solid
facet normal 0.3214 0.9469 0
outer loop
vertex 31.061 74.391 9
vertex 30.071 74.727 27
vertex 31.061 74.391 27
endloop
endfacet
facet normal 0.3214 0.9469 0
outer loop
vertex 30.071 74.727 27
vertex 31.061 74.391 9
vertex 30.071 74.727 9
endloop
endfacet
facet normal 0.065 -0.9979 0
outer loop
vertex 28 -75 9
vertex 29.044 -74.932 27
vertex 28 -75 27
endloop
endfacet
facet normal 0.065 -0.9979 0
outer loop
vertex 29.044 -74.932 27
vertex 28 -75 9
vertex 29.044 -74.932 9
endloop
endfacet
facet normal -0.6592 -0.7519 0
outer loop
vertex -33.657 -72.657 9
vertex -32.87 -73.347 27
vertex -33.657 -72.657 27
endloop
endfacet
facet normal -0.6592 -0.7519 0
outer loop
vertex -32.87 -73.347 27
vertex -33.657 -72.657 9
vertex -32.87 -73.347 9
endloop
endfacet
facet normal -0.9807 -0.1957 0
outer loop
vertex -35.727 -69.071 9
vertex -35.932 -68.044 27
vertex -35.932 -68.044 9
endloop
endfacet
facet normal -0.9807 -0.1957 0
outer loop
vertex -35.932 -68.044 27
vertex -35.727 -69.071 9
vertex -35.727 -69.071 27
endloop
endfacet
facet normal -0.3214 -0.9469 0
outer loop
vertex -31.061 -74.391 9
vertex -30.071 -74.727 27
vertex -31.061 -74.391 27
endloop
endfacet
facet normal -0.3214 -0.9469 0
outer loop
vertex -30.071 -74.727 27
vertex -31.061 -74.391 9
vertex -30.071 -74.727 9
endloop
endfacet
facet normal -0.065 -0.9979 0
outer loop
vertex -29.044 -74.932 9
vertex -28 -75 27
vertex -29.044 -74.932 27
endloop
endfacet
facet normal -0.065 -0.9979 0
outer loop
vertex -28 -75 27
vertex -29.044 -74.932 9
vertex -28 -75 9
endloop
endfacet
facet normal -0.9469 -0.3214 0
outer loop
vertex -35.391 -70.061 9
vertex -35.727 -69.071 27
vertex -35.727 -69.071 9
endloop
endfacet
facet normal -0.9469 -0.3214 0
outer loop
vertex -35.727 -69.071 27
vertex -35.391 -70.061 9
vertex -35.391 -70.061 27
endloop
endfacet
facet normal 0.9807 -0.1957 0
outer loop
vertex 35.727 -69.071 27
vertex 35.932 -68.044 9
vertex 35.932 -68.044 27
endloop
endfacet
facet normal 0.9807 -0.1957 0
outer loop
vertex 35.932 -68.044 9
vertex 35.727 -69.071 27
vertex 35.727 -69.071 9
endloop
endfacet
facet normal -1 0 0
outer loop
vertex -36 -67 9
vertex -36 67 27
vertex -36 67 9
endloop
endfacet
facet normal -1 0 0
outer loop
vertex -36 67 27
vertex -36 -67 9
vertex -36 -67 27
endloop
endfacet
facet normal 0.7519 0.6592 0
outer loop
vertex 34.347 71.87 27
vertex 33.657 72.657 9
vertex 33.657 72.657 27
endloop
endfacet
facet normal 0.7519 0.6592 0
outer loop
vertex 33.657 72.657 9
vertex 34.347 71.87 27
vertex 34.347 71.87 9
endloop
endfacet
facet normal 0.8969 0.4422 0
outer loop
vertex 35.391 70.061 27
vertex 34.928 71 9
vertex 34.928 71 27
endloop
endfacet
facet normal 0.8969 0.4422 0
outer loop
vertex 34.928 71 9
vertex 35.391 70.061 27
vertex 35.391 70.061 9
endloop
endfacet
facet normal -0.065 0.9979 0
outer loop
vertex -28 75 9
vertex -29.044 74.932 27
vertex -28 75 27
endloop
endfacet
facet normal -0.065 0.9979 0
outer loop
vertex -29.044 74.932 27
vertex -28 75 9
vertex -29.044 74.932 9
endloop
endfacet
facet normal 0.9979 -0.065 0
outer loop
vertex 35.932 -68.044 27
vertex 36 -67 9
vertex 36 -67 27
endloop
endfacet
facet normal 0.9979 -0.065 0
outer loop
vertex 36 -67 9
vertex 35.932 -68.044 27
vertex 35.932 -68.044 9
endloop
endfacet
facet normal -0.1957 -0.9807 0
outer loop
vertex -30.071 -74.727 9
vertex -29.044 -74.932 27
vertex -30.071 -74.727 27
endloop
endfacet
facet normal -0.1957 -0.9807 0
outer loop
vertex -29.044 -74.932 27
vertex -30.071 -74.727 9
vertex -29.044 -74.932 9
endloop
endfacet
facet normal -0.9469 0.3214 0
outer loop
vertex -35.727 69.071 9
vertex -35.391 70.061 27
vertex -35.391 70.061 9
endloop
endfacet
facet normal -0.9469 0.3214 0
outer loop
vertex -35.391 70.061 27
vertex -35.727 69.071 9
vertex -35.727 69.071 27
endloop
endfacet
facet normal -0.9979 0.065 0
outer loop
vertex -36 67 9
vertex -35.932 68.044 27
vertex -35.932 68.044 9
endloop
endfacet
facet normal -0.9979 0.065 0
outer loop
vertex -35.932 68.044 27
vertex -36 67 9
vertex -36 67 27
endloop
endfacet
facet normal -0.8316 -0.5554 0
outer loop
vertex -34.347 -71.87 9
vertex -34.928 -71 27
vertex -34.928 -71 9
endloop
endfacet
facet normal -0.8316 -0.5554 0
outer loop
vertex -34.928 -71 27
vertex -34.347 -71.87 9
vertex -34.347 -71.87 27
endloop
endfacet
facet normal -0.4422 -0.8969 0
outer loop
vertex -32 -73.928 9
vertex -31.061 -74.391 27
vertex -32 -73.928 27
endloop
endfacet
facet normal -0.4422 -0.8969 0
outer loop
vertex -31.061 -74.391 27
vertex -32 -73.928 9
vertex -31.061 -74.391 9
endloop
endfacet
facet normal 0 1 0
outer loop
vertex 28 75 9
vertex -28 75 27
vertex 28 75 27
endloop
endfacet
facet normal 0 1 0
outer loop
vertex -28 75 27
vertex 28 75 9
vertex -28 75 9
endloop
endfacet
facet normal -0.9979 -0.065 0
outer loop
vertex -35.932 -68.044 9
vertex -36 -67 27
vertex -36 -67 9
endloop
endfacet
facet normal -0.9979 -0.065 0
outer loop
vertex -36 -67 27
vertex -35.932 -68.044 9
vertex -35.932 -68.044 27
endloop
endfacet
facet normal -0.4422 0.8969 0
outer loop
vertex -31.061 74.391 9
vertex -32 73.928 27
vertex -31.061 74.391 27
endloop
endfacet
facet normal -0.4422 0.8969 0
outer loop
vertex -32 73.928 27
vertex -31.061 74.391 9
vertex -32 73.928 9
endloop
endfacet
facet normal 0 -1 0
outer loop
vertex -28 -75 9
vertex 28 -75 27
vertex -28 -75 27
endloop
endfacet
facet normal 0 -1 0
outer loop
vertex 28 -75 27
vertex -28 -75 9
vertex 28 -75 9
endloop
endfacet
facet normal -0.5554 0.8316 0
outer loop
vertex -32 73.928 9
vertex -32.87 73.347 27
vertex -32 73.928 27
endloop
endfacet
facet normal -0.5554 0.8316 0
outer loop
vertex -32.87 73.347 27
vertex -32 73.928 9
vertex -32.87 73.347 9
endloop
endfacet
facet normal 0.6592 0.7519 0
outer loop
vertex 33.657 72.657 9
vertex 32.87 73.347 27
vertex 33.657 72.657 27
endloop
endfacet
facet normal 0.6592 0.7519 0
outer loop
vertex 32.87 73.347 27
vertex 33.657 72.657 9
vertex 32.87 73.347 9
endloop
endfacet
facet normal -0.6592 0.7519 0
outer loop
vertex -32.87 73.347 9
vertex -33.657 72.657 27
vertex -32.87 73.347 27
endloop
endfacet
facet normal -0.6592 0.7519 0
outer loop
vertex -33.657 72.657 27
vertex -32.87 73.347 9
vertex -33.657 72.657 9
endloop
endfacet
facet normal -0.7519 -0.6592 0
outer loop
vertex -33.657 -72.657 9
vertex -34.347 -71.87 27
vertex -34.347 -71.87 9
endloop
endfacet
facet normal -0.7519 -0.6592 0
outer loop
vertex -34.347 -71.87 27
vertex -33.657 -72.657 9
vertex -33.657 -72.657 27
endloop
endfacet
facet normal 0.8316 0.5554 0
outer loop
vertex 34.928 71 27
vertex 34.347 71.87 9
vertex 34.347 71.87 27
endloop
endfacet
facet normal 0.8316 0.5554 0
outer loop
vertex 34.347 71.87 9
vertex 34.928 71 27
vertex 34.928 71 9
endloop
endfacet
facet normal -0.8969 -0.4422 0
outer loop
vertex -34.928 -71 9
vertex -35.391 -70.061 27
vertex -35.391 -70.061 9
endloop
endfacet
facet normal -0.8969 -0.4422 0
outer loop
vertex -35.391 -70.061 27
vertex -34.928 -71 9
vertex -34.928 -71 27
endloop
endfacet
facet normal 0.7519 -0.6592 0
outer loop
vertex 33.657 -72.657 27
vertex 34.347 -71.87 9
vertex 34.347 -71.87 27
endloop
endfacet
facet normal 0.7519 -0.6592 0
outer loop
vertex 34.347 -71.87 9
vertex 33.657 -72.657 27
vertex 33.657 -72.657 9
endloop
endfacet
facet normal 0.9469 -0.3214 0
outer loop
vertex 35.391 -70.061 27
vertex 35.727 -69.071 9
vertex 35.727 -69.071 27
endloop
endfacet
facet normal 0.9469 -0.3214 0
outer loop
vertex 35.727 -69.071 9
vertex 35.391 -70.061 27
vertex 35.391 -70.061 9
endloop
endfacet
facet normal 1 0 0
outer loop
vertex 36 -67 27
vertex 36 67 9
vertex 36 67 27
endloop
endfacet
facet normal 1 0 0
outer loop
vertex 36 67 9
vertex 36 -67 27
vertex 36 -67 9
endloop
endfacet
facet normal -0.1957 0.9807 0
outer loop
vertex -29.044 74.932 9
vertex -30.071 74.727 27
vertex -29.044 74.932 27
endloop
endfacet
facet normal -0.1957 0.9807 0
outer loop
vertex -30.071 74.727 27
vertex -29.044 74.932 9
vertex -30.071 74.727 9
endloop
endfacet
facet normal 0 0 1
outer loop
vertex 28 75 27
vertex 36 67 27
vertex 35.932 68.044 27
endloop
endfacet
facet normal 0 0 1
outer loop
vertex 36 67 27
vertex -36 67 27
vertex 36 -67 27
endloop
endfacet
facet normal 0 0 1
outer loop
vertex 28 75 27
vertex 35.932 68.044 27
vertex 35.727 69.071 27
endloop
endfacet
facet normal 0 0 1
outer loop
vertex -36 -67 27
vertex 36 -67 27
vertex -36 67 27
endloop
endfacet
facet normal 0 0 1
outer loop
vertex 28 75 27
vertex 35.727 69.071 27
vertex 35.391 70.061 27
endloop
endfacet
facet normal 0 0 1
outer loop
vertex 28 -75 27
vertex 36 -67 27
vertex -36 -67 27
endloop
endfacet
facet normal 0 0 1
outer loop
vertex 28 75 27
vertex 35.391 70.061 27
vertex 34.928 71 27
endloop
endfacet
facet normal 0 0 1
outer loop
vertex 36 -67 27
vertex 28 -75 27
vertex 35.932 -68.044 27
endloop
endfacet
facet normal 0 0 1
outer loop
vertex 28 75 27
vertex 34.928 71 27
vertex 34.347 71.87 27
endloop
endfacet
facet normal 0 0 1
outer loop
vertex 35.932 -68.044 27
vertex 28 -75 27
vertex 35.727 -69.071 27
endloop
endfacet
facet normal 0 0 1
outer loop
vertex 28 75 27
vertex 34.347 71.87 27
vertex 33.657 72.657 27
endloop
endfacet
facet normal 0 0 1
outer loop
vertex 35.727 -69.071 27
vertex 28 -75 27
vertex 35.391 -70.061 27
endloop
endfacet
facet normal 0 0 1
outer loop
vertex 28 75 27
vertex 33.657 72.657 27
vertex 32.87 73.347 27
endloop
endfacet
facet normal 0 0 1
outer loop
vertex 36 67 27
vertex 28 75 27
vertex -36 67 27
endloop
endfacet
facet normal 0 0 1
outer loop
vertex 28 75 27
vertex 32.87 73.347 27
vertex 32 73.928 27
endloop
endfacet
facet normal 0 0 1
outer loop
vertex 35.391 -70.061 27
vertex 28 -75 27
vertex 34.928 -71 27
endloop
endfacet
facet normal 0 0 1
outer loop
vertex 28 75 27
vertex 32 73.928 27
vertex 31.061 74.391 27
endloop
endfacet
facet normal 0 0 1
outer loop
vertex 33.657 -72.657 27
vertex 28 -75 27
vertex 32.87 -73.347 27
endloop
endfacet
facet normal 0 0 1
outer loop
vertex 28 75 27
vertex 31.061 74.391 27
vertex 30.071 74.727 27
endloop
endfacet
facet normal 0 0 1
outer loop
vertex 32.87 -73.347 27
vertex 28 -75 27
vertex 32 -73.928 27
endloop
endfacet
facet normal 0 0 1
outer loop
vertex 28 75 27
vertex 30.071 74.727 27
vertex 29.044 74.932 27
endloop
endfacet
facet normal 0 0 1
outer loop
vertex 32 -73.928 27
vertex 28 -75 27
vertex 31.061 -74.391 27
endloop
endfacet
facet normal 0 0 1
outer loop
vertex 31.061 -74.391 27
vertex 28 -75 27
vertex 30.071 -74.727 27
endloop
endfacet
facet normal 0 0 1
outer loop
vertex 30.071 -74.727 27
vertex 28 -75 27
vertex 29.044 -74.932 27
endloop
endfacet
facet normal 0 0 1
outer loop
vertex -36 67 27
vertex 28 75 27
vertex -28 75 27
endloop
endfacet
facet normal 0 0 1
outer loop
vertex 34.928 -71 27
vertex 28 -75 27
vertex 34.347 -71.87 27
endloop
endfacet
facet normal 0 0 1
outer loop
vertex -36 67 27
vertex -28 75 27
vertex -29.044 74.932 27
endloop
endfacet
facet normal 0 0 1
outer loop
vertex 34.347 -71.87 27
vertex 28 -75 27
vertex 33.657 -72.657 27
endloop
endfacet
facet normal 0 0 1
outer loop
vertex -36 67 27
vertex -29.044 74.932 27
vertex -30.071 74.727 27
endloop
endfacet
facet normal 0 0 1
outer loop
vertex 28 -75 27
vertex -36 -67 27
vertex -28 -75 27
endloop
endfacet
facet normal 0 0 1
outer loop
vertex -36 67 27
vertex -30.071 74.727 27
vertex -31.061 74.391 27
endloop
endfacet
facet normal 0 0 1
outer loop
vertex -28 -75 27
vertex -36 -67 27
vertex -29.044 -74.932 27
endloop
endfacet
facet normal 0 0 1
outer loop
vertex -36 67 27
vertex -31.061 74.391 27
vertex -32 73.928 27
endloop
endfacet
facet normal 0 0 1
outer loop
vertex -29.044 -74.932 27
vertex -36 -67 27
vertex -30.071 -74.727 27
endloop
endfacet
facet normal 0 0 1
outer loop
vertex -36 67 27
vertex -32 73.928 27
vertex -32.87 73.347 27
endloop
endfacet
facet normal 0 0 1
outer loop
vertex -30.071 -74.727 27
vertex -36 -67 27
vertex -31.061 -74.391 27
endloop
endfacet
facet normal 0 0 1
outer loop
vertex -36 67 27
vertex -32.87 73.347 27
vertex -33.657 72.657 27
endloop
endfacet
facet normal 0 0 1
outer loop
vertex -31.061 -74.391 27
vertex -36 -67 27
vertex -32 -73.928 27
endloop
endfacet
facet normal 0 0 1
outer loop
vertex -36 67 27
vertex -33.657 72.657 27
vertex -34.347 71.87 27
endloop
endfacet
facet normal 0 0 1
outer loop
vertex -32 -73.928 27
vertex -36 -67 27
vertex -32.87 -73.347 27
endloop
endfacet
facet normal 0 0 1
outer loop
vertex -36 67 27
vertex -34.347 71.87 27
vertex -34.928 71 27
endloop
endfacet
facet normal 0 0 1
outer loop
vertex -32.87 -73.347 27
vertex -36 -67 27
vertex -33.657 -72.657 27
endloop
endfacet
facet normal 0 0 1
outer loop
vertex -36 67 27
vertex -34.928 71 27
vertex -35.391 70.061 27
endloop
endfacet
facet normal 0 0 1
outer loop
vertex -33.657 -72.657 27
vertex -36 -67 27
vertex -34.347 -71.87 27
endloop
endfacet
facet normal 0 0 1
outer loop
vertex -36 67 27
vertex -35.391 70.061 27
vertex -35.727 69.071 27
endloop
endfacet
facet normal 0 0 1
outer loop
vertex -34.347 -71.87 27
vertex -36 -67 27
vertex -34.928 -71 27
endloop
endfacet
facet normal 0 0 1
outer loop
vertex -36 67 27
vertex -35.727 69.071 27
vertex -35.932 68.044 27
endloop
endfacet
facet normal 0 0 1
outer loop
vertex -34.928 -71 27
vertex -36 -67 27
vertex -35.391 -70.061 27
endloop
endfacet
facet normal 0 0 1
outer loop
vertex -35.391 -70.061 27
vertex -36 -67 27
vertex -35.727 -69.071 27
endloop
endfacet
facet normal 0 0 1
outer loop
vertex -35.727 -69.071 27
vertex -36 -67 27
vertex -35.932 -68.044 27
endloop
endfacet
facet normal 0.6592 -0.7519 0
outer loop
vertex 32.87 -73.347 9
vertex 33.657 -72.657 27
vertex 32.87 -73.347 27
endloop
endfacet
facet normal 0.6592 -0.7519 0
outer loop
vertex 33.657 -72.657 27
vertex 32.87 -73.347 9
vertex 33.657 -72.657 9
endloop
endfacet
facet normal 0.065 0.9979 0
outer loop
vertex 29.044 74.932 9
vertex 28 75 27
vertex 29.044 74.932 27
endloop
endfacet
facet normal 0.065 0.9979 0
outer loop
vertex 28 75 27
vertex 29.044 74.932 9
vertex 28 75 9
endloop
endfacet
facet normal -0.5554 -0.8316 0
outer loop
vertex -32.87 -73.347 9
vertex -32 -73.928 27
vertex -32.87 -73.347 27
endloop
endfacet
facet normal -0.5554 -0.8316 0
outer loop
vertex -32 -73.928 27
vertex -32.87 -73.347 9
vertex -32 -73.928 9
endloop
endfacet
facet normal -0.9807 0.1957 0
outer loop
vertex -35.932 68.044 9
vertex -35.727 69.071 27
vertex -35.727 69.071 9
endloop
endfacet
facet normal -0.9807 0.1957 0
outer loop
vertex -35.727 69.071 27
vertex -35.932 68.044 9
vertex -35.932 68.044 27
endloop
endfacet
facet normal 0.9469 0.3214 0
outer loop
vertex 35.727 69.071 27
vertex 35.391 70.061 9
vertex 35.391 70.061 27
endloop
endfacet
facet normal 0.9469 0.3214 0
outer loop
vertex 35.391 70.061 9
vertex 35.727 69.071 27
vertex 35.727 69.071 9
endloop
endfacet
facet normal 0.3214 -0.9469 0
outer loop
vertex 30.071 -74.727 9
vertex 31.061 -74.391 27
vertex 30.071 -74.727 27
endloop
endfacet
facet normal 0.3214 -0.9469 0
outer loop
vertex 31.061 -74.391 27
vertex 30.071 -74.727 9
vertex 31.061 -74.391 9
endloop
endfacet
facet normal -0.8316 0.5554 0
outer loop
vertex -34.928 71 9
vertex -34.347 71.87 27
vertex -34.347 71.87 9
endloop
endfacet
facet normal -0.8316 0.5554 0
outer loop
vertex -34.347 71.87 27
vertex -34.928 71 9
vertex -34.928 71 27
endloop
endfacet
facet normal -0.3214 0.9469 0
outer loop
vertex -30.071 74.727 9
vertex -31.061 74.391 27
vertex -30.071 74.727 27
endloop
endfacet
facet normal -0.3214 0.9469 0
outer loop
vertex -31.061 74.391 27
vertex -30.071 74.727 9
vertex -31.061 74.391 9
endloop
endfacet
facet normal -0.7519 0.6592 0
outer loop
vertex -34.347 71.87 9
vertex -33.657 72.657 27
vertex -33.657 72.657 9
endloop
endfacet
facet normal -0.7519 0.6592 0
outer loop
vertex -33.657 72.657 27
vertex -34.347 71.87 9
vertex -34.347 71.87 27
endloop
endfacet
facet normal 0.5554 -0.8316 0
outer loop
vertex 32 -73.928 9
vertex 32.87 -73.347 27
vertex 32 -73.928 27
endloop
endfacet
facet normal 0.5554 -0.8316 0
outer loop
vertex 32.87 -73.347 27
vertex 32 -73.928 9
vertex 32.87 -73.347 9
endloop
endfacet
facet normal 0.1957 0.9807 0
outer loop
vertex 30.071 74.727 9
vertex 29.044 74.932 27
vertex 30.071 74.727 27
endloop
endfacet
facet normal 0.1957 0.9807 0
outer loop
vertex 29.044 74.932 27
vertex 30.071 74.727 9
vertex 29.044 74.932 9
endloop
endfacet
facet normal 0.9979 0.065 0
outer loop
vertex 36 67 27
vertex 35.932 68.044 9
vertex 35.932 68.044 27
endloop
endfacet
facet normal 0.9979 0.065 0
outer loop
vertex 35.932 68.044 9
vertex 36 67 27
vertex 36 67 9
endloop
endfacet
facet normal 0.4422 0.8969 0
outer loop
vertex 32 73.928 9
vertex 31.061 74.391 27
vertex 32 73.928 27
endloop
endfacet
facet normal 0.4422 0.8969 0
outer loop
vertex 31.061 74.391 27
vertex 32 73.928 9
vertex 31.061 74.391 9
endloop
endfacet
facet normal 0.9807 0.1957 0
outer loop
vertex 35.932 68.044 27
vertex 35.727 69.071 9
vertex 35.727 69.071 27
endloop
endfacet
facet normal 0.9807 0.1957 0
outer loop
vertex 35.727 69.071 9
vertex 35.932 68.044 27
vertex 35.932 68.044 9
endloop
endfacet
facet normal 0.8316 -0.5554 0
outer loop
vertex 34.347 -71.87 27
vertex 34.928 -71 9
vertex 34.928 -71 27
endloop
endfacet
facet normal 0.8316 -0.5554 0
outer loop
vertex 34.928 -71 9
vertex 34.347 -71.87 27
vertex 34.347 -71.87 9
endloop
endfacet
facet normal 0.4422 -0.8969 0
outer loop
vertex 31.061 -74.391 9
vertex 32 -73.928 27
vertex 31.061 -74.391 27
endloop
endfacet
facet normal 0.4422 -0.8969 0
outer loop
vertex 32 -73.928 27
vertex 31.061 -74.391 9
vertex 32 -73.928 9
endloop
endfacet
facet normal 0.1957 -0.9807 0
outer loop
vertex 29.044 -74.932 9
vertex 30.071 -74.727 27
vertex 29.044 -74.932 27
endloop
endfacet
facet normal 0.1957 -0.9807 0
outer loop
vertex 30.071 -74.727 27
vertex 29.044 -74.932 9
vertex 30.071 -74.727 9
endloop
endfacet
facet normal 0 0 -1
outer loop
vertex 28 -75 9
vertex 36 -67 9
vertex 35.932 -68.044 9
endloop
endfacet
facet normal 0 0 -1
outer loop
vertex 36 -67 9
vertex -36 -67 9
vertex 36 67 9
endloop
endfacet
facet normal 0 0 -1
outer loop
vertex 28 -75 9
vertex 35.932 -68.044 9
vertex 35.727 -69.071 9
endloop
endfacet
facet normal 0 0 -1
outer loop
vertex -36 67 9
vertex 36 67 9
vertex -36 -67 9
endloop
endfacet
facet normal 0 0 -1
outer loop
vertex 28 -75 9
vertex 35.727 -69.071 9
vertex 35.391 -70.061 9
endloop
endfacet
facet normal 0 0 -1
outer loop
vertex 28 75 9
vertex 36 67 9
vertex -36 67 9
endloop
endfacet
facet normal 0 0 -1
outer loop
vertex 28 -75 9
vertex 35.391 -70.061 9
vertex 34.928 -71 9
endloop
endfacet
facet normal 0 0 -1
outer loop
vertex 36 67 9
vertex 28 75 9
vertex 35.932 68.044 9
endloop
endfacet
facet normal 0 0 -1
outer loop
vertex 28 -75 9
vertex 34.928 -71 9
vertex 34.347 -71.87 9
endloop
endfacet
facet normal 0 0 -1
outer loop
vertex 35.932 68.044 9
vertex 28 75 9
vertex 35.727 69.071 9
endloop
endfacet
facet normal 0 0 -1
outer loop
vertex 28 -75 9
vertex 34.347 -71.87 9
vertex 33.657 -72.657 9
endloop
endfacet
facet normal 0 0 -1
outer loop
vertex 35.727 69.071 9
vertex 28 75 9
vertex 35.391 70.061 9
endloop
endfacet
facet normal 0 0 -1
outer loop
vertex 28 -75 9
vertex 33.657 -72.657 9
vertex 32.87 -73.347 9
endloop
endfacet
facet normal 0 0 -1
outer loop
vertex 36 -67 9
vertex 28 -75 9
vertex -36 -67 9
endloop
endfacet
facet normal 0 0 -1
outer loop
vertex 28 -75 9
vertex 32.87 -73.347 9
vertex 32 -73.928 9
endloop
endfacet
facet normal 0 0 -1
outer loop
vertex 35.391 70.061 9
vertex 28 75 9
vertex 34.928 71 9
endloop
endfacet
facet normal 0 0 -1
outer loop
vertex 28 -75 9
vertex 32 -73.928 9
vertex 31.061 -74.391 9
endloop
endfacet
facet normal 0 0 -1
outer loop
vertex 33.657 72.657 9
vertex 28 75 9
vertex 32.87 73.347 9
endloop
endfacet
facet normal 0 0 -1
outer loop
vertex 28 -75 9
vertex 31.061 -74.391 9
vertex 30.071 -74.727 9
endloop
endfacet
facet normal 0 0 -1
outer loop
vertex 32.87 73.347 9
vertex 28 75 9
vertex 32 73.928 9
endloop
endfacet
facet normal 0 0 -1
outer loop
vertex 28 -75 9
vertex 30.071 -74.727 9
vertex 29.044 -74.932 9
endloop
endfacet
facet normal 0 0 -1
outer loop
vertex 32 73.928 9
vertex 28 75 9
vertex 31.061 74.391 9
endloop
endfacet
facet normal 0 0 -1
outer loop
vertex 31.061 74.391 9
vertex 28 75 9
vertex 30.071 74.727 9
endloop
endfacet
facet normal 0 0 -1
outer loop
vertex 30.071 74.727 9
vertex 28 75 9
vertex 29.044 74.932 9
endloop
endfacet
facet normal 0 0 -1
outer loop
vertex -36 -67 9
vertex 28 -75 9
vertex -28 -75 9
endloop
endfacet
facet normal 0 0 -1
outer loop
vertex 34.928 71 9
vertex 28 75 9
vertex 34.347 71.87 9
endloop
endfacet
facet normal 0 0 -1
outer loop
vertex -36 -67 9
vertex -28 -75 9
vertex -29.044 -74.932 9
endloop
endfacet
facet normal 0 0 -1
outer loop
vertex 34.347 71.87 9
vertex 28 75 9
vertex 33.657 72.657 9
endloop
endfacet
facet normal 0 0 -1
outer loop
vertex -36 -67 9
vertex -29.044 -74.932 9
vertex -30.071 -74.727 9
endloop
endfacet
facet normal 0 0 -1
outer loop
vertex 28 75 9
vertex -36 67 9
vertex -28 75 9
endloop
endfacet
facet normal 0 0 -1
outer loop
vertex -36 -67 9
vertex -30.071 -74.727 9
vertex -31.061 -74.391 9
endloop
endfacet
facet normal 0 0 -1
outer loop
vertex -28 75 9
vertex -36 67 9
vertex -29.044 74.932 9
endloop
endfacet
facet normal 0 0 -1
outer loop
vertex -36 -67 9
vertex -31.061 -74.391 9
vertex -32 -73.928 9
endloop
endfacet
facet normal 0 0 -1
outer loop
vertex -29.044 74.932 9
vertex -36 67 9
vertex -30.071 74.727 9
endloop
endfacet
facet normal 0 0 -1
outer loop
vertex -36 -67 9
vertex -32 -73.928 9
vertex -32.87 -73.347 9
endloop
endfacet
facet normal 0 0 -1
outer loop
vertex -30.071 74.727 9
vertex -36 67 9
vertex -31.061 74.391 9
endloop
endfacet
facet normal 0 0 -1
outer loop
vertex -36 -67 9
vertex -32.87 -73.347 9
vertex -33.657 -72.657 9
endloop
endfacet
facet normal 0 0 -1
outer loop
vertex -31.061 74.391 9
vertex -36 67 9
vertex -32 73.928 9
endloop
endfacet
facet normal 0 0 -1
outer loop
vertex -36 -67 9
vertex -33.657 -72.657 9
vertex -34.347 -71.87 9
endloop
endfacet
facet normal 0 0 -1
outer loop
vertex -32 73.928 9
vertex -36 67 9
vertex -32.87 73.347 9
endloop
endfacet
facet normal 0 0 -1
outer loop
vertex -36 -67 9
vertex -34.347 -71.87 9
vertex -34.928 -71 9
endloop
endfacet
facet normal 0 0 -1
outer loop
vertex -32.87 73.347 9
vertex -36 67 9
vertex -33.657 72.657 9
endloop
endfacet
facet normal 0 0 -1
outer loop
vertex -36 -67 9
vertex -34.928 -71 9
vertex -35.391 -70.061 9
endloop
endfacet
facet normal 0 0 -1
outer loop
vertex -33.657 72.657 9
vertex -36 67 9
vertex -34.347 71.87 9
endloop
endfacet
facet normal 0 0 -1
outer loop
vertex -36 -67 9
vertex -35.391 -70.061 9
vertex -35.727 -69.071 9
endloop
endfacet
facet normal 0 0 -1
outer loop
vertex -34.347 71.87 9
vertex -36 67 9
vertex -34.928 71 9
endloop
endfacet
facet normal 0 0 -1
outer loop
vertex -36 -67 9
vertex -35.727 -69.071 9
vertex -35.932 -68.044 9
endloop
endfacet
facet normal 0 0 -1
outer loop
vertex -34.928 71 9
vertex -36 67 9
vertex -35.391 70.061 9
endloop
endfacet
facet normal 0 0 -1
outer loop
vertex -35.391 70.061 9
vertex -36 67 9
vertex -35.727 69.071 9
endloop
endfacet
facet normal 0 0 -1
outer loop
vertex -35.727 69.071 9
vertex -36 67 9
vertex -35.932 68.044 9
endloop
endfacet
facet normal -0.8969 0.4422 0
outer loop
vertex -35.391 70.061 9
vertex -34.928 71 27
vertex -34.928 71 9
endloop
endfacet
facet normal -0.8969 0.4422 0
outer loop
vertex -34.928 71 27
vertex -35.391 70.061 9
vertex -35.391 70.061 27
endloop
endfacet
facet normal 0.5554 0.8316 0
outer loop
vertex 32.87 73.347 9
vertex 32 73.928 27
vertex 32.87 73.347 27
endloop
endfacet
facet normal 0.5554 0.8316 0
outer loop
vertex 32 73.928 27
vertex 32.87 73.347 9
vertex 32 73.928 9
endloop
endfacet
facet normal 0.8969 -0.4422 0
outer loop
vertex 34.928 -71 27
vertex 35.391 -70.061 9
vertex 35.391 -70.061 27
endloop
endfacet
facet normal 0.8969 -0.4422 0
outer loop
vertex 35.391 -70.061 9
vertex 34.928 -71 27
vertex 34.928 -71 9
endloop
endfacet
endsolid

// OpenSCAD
// Relmote Pocket envelope v0.1
// Concept-only parametric massing model; NOT a manufacturable enclosure.

$fn = 48;

body_h = 150;
body_w = 72;
body_t = 18;
corner_r = 8;

module_t = 6;
module_gap = 4;
s_zone = 68;
rear_margin = 2;

display_w = 52;
display_h = 28;
display_depth = 0.8;

button_auth_w = 20;
button_auth_h = 9;
button_stop_d = 13;

module rounded_box(w, h, t, r) {
    linear_extrude(height=t)
        offset(r=r)
            square([w-2*r, h-2*r], center=true);
}

module body() {
    translate([0,0,body_t/2])
        rounded_box(body_w, body_h, body_t, corner_r);
}

module display_window() {
    translate([0, 28, body_t + display_depth/2])
        cube([display_w, display_h, display_depth], center=true);
}

module authorize_button() {
    translate([-18, -52, body_t + 1])
        cube([button_auth_w, button_auth_h, 2], center=true);
}

module stop_button() {
    translate([22, -52, body_t + 1])
        cylinder(h=2, d=button_stop_d, center=true);
}

module snap_module(top=true) {
    y = top ? (module_gap/2 + s_zone/2) : -(module_gap/2 + s_zone/2);
    translate([0, y, -module_t/2])
        rounded_box(s_zone, s_zone, module_t, 5);
}

// Core body
color("gray") body();

// Front UI massing
color("black") display_window();
color("green") authorize_button();
color("red") stop_button();

// Uncomment to visualize snap modules on rear.
// color("darkslategray", 0.8) snap_module(true);
// color("slategray", 0.8) snap_module(false);
